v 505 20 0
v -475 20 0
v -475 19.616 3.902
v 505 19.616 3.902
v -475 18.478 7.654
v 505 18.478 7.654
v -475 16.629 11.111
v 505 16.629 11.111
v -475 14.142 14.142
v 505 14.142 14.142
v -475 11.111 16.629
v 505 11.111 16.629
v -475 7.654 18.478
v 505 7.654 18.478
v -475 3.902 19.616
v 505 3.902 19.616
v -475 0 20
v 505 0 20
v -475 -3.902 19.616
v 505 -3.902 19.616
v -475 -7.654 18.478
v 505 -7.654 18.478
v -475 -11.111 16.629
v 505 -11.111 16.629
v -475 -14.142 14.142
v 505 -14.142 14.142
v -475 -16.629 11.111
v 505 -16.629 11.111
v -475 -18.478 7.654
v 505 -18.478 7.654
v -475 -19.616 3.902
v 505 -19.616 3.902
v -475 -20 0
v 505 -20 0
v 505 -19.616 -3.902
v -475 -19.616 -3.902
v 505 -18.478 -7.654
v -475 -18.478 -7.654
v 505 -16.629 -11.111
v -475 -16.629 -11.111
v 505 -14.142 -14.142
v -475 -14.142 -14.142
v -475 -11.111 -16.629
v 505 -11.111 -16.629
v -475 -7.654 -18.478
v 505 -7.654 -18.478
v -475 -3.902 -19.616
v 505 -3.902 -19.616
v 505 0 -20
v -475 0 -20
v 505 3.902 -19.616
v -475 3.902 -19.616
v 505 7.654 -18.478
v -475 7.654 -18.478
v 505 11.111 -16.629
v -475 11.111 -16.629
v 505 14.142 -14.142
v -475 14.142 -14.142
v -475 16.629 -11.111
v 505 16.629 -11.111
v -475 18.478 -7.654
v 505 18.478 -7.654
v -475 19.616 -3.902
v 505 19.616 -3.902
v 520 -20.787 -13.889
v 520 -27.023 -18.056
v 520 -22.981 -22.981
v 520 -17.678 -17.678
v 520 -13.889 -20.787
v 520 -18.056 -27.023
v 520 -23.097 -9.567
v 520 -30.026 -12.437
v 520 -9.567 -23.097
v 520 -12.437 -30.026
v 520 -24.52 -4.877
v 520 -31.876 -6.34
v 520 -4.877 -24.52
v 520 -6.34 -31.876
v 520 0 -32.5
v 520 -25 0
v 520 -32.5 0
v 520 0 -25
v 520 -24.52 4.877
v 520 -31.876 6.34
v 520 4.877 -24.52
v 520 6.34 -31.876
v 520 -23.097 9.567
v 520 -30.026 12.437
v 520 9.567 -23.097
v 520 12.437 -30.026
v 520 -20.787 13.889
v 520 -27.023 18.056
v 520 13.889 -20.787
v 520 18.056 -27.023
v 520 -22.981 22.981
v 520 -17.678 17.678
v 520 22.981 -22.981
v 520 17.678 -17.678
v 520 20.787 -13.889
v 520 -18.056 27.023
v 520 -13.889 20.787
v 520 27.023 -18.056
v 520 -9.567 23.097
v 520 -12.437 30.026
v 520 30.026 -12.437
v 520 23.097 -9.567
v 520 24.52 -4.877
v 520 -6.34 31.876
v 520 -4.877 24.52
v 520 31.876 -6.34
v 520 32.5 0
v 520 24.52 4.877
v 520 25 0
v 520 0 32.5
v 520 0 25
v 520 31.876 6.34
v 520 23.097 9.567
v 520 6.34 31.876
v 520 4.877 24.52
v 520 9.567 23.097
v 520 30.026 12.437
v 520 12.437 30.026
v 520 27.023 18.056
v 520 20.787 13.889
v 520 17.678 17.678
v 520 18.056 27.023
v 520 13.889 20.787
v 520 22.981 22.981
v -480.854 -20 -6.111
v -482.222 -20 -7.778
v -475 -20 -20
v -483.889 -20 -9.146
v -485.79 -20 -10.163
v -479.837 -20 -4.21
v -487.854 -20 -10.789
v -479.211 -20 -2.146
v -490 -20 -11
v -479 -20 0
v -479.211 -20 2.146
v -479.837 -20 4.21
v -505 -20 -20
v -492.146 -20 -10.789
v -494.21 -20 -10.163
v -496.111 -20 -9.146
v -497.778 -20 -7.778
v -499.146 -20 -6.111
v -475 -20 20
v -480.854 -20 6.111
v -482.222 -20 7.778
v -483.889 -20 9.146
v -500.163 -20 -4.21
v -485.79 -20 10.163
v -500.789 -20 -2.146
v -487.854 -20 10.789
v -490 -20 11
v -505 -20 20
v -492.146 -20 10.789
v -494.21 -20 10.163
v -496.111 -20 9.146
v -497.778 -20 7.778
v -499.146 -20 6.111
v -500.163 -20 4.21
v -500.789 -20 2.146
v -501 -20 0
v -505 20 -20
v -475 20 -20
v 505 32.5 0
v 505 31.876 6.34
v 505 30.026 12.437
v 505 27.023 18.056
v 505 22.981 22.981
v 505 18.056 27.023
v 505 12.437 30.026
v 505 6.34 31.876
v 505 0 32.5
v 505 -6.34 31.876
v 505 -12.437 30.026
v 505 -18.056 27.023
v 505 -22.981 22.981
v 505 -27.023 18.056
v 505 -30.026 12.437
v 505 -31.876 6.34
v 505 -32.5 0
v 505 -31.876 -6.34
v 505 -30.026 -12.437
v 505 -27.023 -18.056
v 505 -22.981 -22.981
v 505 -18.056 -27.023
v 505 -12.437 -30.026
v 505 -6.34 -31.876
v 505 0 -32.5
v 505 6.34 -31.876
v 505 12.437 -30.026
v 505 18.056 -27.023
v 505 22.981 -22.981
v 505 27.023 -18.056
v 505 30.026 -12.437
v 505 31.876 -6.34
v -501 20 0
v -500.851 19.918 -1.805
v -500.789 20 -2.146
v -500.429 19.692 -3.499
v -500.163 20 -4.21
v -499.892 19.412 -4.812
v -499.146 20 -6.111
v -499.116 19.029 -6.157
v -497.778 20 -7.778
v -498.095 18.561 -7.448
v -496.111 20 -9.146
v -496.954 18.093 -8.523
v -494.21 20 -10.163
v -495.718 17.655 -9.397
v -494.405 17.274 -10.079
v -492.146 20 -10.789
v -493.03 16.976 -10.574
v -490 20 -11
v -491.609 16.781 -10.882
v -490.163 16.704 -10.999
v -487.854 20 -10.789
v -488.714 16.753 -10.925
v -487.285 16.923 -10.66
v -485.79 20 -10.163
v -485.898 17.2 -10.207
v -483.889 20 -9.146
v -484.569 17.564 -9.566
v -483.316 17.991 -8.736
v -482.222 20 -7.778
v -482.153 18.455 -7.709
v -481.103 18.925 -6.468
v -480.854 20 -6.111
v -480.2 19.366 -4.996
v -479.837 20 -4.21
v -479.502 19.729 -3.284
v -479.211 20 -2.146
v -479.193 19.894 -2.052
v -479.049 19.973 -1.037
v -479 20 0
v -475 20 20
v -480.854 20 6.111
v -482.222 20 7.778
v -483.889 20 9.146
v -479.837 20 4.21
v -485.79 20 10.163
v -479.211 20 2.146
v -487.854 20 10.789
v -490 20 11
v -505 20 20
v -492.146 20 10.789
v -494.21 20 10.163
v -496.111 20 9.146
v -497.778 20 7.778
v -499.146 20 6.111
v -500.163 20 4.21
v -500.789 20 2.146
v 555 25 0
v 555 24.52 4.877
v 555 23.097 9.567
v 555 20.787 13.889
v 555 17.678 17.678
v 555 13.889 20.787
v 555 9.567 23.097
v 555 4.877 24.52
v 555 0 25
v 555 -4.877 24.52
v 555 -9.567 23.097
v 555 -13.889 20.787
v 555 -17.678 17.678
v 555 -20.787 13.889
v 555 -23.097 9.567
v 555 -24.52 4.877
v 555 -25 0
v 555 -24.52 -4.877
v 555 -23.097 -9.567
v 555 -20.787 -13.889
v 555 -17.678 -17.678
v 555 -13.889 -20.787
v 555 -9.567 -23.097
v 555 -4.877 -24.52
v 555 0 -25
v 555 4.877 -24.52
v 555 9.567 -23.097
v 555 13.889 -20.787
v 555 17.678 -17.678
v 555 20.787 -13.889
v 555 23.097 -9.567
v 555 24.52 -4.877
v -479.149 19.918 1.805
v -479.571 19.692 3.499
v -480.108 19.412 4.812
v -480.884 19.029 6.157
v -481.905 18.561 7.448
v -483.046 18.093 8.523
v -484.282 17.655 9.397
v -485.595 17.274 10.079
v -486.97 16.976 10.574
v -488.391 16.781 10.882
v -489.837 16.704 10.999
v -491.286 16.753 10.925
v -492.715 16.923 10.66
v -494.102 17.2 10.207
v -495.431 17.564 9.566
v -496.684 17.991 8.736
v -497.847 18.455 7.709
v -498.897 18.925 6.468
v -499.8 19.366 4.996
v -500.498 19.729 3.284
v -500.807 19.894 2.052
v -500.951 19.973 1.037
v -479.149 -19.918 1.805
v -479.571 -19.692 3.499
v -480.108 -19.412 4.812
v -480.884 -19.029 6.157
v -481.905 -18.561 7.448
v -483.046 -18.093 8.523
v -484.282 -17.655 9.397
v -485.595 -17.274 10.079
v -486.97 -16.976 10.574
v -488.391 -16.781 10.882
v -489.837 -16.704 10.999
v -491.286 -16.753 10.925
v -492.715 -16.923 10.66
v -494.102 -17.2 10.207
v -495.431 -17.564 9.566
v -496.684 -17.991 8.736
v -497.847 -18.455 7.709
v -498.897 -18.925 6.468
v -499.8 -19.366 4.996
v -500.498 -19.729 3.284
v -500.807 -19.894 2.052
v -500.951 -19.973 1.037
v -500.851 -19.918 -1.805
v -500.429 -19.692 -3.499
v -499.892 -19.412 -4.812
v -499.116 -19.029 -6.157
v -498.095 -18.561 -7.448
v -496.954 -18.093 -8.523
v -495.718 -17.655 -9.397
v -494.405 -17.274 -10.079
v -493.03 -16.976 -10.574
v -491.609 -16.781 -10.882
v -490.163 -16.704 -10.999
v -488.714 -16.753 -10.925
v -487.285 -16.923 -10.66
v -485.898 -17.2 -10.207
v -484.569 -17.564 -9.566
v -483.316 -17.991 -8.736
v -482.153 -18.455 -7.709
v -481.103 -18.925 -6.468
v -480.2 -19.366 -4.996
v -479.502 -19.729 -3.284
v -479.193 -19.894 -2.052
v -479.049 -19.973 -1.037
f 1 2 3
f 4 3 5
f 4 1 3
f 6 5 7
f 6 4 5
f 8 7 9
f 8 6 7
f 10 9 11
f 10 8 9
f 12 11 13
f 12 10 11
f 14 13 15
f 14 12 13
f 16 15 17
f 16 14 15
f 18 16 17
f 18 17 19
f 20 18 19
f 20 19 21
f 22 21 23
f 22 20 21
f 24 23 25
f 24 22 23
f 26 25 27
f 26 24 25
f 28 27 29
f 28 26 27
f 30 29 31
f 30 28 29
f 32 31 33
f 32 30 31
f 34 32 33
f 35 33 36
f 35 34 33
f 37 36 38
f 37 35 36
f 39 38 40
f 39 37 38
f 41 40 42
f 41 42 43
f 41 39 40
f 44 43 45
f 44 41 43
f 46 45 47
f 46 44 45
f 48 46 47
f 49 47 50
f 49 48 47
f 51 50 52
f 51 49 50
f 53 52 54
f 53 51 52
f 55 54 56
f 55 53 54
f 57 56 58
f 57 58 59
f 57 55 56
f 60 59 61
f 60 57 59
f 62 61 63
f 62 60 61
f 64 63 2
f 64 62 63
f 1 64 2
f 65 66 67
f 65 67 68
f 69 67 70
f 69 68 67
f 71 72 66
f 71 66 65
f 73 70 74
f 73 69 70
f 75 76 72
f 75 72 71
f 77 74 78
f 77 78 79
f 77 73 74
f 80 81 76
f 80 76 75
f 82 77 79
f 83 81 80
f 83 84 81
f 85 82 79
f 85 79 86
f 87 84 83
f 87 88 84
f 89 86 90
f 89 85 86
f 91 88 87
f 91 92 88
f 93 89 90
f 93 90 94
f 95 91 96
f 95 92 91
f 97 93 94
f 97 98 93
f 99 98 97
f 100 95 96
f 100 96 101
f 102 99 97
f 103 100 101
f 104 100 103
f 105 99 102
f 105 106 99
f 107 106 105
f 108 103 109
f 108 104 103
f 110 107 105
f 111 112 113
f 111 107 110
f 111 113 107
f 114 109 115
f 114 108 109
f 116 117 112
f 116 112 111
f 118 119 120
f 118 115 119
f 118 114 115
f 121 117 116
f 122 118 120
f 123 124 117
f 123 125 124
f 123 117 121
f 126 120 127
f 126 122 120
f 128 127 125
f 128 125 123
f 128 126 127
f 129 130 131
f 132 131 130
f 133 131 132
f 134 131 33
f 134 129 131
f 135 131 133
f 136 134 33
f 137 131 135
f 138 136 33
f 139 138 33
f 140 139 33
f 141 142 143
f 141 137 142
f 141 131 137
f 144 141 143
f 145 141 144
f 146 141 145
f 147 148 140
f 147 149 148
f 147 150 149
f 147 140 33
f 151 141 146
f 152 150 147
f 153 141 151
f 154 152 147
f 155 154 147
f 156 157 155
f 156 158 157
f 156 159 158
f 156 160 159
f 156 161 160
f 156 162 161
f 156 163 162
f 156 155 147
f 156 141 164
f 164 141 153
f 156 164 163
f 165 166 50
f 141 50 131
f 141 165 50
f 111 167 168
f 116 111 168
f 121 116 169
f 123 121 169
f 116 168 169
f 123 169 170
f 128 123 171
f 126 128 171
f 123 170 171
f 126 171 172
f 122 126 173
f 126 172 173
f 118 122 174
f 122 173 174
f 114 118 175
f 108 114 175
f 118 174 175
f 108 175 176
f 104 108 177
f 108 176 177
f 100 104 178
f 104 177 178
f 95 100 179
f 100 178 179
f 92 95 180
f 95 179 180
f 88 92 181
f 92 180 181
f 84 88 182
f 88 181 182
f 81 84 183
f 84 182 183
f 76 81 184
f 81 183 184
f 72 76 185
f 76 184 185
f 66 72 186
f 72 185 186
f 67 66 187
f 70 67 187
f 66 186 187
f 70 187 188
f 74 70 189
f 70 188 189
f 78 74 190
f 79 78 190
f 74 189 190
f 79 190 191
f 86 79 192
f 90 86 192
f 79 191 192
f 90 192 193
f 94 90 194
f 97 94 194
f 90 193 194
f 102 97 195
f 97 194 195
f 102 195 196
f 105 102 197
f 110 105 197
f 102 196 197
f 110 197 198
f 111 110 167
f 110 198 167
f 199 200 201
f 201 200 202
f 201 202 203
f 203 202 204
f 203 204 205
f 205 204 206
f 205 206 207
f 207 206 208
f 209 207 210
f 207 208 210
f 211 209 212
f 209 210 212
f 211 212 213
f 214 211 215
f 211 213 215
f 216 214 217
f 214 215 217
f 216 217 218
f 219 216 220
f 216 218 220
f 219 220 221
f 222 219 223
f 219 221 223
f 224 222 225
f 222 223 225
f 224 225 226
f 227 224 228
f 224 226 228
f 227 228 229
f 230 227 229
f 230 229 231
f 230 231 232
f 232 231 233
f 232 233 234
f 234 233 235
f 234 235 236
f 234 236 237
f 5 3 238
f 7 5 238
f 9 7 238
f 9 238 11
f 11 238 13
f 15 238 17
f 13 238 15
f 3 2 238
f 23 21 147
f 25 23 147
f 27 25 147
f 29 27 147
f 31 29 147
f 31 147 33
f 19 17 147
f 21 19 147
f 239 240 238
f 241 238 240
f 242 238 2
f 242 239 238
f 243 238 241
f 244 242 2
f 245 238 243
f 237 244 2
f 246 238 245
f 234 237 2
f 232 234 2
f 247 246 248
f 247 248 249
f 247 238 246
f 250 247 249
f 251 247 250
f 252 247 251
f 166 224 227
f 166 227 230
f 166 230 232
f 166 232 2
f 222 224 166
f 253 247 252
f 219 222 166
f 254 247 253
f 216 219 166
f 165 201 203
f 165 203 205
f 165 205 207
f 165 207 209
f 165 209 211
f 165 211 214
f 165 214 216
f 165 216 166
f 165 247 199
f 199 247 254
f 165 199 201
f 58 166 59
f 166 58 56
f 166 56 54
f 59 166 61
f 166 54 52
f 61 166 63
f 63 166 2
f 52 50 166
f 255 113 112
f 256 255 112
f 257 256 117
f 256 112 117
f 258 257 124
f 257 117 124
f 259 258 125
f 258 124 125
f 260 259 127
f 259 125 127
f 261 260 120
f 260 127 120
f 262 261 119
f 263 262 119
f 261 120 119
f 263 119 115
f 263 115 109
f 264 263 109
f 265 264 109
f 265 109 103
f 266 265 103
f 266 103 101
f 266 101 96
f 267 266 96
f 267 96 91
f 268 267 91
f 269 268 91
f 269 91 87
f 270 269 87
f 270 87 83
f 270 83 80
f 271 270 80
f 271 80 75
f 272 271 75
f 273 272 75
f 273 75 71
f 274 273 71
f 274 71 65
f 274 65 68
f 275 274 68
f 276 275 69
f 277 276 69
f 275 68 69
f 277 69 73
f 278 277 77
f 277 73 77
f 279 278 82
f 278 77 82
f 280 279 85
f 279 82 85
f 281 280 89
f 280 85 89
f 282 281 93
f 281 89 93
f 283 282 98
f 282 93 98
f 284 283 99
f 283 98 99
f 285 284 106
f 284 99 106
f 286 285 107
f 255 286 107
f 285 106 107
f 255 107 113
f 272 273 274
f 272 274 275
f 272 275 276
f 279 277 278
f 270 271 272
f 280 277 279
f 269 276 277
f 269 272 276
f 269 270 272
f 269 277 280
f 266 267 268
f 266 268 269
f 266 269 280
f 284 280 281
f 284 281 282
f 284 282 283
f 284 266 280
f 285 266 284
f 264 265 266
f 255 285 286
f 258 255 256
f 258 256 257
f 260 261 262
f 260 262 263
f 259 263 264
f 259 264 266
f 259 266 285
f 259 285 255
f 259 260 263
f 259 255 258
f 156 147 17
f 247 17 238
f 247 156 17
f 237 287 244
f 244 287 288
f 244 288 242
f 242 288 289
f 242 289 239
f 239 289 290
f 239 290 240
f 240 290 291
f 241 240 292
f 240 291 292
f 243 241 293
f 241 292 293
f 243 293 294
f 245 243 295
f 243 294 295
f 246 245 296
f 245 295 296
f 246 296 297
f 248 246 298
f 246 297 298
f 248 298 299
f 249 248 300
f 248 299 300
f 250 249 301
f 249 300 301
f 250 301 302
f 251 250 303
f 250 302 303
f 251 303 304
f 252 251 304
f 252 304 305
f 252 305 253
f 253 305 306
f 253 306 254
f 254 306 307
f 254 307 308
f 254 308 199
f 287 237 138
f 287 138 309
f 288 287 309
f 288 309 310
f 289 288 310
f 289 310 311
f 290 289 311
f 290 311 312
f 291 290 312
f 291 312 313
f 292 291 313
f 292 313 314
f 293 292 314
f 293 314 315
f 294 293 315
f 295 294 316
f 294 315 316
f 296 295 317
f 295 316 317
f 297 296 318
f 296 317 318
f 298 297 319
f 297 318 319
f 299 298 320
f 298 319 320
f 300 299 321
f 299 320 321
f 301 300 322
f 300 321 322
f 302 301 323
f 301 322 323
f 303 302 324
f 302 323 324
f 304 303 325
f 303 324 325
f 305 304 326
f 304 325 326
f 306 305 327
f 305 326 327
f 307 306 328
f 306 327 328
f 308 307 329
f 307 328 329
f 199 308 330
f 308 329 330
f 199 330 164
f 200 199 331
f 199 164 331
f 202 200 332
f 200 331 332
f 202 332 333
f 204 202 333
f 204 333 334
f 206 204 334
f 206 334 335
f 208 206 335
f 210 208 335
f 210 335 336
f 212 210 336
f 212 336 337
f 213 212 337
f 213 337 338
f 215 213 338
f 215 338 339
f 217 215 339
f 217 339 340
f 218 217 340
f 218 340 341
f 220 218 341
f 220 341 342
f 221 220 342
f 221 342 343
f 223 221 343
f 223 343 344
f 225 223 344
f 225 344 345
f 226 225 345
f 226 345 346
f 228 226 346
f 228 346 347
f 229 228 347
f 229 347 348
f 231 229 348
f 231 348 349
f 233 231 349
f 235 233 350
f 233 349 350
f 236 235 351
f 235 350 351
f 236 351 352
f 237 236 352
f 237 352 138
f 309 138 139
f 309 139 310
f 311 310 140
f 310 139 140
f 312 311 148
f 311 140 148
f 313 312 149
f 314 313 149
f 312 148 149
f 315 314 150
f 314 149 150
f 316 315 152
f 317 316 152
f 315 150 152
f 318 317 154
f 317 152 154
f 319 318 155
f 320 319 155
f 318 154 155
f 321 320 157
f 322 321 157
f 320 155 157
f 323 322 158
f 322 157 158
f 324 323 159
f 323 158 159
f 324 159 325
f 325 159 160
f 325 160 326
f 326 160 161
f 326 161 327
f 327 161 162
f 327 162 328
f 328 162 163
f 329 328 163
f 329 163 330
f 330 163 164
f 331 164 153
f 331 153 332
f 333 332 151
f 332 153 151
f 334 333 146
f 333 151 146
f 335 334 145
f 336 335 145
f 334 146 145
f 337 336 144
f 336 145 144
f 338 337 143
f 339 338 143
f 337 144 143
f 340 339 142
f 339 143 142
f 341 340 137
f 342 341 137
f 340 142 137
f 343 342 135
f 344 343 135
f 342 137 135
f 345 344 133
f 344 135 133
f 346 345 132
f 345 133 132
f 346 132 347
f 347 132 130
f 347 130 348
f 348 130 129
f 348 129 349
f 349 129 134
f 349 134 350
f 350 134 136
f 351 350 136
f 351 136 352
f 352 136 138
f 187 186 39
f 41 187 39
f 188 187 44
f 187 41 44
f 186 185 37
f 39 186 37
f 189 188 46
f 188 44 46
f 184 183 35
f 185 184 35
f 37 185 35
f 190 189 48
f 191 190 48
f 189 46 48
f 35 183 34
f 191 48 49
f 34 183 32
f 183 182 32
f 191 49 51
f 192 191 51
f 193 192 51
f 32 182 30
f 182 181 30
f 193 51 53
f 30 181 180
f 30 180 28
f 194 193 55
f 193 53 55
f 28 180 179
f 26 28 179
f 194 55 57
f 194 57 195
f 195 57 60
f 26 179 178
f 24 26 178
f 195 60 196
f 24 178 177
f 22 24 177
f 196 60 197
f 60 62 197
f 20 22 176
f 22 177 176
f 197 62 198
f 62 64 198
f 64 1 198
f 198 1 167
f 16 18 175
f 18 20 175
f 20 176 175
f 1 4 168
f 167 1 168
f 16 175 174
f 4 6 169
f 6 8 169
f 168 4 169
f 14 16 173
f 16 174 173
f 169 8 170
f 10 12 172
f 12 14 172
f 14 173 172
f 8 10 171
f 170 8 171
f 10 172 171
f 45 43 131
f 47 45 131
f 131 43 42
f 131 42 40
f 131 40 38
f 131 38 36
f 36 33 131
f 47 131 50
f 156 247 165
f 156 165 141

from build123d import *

# Parameters (mm, degrees)
F0_R          = 20
F1_DEPTH      = 505
F2_R          = 25
F2_R_2        = 20
F1_FACE_R     = 20
F3_DEPTH      = 50
F2_R_3        = 32.5
F4_DEPTH      = 15
F5_R          = 11
F6_DEPTH      = 32.501
F6_DEPTH_BACK = 25
F8_DEPTH      = 30
F10_DEPTH     = 52.501


with BuildPart() as f1:
    # F0 (on Right) → F1 (new body, symmetric)
    with BuildSketch(Plane.YZ):
        Circle(F0_R)
    extrude(amount=F1_DEPTH, both=True)

    # F2 (on face) + F1_face (on face) → F3 (join)
    with BuildSketch(Plane.YZ.offset(505)):
        Circle(F2_R)
        Circle(F2_R_2, mode=Mode.SUBTRACT)
    with BuildSketch(Plane.YZ.offset(505)):
        Circle(F1_FACE_R)
    extrude(amount=F3_DEPTH)

    # F2 (on face) → F4 (join)
    with BuildSketch(Plane.YZ.offset(505)):
        Circle(F2_R_3)
        Circle(F2_R, mode=Mode.SUBTRACT)
    extrude(amount=F4_DEPTH)

    # F5 (on Front) → F6 (cut, two sides)
    with BuildSketch(Plane.XZ) as f6_sk:
        with Locations((-490, 0)):
            Circle(F5_R)
    extrude(amount=-F6_DEPTH, mode=Mode.SUBTRACT)
    extrude(f6_sk.sketch, amount=F6_DEPTH_BACK, mode=Mode.SUBTRACT)

    # F7 (on face) → F8 (join)
    with BuildSketch(Plane(origin=(-505, 0, 0), x_dir=(0, -1, 0), z_dir=(-1, 0, 0))):
        with BuildLine():
            ThreePointArc((-20, 0), (-14.1421356364, 14.142135611), (-3.59e-08, 20))
            Line((-3.59e-08, 20), (-20, 20))
            Line((-20, 20), (-20, 0))
        make_face()
        with BuildLine():
            ThreePointArc((0, -20), (-14.1421356237, -14.1421356237), (-20, 0))
            Line((-20, 0), (-20, -20))
            Line((-20, -20), (0, -20))
        make_face()
        with BuildLine():
            Line((20, -20), (20, 0))
            ThreePointArc((20, 0), (14.1421356237, -14.1421356237), (0, -20))
            Line((0, -20), (20, -20))
        make_face()
        with BuildLine():
            Line((20, 0), (20, 20))
            Line((20, 20), (-3.59e-08, 20))
            ThreePointArc((-3.59e-08, 20), (14.142135611, 14.1421356364), (20, 0))
        make_face()
    extrude(amount=-F8_DEPTH)

    # F9 (on face) → F10 (cut, through all)
    with BuildSketch(Plane.XZ.offset(20)):
        with BuildLine():
            Line((-501, 0), (-479, 0))
            ThreePointArc((-479, 0), (-490, 11), (-501, 0))
        make_face()
        with BuildLine():
            ThreePointArc((-501, 0), (-490, -11), (-479, 0))
            Line((-479, 0), (-501, 0))
        make_face()
    extrude(amount=-F10_DEPTH, mode=Mode.SUBTRACT)


solid = f1.part
